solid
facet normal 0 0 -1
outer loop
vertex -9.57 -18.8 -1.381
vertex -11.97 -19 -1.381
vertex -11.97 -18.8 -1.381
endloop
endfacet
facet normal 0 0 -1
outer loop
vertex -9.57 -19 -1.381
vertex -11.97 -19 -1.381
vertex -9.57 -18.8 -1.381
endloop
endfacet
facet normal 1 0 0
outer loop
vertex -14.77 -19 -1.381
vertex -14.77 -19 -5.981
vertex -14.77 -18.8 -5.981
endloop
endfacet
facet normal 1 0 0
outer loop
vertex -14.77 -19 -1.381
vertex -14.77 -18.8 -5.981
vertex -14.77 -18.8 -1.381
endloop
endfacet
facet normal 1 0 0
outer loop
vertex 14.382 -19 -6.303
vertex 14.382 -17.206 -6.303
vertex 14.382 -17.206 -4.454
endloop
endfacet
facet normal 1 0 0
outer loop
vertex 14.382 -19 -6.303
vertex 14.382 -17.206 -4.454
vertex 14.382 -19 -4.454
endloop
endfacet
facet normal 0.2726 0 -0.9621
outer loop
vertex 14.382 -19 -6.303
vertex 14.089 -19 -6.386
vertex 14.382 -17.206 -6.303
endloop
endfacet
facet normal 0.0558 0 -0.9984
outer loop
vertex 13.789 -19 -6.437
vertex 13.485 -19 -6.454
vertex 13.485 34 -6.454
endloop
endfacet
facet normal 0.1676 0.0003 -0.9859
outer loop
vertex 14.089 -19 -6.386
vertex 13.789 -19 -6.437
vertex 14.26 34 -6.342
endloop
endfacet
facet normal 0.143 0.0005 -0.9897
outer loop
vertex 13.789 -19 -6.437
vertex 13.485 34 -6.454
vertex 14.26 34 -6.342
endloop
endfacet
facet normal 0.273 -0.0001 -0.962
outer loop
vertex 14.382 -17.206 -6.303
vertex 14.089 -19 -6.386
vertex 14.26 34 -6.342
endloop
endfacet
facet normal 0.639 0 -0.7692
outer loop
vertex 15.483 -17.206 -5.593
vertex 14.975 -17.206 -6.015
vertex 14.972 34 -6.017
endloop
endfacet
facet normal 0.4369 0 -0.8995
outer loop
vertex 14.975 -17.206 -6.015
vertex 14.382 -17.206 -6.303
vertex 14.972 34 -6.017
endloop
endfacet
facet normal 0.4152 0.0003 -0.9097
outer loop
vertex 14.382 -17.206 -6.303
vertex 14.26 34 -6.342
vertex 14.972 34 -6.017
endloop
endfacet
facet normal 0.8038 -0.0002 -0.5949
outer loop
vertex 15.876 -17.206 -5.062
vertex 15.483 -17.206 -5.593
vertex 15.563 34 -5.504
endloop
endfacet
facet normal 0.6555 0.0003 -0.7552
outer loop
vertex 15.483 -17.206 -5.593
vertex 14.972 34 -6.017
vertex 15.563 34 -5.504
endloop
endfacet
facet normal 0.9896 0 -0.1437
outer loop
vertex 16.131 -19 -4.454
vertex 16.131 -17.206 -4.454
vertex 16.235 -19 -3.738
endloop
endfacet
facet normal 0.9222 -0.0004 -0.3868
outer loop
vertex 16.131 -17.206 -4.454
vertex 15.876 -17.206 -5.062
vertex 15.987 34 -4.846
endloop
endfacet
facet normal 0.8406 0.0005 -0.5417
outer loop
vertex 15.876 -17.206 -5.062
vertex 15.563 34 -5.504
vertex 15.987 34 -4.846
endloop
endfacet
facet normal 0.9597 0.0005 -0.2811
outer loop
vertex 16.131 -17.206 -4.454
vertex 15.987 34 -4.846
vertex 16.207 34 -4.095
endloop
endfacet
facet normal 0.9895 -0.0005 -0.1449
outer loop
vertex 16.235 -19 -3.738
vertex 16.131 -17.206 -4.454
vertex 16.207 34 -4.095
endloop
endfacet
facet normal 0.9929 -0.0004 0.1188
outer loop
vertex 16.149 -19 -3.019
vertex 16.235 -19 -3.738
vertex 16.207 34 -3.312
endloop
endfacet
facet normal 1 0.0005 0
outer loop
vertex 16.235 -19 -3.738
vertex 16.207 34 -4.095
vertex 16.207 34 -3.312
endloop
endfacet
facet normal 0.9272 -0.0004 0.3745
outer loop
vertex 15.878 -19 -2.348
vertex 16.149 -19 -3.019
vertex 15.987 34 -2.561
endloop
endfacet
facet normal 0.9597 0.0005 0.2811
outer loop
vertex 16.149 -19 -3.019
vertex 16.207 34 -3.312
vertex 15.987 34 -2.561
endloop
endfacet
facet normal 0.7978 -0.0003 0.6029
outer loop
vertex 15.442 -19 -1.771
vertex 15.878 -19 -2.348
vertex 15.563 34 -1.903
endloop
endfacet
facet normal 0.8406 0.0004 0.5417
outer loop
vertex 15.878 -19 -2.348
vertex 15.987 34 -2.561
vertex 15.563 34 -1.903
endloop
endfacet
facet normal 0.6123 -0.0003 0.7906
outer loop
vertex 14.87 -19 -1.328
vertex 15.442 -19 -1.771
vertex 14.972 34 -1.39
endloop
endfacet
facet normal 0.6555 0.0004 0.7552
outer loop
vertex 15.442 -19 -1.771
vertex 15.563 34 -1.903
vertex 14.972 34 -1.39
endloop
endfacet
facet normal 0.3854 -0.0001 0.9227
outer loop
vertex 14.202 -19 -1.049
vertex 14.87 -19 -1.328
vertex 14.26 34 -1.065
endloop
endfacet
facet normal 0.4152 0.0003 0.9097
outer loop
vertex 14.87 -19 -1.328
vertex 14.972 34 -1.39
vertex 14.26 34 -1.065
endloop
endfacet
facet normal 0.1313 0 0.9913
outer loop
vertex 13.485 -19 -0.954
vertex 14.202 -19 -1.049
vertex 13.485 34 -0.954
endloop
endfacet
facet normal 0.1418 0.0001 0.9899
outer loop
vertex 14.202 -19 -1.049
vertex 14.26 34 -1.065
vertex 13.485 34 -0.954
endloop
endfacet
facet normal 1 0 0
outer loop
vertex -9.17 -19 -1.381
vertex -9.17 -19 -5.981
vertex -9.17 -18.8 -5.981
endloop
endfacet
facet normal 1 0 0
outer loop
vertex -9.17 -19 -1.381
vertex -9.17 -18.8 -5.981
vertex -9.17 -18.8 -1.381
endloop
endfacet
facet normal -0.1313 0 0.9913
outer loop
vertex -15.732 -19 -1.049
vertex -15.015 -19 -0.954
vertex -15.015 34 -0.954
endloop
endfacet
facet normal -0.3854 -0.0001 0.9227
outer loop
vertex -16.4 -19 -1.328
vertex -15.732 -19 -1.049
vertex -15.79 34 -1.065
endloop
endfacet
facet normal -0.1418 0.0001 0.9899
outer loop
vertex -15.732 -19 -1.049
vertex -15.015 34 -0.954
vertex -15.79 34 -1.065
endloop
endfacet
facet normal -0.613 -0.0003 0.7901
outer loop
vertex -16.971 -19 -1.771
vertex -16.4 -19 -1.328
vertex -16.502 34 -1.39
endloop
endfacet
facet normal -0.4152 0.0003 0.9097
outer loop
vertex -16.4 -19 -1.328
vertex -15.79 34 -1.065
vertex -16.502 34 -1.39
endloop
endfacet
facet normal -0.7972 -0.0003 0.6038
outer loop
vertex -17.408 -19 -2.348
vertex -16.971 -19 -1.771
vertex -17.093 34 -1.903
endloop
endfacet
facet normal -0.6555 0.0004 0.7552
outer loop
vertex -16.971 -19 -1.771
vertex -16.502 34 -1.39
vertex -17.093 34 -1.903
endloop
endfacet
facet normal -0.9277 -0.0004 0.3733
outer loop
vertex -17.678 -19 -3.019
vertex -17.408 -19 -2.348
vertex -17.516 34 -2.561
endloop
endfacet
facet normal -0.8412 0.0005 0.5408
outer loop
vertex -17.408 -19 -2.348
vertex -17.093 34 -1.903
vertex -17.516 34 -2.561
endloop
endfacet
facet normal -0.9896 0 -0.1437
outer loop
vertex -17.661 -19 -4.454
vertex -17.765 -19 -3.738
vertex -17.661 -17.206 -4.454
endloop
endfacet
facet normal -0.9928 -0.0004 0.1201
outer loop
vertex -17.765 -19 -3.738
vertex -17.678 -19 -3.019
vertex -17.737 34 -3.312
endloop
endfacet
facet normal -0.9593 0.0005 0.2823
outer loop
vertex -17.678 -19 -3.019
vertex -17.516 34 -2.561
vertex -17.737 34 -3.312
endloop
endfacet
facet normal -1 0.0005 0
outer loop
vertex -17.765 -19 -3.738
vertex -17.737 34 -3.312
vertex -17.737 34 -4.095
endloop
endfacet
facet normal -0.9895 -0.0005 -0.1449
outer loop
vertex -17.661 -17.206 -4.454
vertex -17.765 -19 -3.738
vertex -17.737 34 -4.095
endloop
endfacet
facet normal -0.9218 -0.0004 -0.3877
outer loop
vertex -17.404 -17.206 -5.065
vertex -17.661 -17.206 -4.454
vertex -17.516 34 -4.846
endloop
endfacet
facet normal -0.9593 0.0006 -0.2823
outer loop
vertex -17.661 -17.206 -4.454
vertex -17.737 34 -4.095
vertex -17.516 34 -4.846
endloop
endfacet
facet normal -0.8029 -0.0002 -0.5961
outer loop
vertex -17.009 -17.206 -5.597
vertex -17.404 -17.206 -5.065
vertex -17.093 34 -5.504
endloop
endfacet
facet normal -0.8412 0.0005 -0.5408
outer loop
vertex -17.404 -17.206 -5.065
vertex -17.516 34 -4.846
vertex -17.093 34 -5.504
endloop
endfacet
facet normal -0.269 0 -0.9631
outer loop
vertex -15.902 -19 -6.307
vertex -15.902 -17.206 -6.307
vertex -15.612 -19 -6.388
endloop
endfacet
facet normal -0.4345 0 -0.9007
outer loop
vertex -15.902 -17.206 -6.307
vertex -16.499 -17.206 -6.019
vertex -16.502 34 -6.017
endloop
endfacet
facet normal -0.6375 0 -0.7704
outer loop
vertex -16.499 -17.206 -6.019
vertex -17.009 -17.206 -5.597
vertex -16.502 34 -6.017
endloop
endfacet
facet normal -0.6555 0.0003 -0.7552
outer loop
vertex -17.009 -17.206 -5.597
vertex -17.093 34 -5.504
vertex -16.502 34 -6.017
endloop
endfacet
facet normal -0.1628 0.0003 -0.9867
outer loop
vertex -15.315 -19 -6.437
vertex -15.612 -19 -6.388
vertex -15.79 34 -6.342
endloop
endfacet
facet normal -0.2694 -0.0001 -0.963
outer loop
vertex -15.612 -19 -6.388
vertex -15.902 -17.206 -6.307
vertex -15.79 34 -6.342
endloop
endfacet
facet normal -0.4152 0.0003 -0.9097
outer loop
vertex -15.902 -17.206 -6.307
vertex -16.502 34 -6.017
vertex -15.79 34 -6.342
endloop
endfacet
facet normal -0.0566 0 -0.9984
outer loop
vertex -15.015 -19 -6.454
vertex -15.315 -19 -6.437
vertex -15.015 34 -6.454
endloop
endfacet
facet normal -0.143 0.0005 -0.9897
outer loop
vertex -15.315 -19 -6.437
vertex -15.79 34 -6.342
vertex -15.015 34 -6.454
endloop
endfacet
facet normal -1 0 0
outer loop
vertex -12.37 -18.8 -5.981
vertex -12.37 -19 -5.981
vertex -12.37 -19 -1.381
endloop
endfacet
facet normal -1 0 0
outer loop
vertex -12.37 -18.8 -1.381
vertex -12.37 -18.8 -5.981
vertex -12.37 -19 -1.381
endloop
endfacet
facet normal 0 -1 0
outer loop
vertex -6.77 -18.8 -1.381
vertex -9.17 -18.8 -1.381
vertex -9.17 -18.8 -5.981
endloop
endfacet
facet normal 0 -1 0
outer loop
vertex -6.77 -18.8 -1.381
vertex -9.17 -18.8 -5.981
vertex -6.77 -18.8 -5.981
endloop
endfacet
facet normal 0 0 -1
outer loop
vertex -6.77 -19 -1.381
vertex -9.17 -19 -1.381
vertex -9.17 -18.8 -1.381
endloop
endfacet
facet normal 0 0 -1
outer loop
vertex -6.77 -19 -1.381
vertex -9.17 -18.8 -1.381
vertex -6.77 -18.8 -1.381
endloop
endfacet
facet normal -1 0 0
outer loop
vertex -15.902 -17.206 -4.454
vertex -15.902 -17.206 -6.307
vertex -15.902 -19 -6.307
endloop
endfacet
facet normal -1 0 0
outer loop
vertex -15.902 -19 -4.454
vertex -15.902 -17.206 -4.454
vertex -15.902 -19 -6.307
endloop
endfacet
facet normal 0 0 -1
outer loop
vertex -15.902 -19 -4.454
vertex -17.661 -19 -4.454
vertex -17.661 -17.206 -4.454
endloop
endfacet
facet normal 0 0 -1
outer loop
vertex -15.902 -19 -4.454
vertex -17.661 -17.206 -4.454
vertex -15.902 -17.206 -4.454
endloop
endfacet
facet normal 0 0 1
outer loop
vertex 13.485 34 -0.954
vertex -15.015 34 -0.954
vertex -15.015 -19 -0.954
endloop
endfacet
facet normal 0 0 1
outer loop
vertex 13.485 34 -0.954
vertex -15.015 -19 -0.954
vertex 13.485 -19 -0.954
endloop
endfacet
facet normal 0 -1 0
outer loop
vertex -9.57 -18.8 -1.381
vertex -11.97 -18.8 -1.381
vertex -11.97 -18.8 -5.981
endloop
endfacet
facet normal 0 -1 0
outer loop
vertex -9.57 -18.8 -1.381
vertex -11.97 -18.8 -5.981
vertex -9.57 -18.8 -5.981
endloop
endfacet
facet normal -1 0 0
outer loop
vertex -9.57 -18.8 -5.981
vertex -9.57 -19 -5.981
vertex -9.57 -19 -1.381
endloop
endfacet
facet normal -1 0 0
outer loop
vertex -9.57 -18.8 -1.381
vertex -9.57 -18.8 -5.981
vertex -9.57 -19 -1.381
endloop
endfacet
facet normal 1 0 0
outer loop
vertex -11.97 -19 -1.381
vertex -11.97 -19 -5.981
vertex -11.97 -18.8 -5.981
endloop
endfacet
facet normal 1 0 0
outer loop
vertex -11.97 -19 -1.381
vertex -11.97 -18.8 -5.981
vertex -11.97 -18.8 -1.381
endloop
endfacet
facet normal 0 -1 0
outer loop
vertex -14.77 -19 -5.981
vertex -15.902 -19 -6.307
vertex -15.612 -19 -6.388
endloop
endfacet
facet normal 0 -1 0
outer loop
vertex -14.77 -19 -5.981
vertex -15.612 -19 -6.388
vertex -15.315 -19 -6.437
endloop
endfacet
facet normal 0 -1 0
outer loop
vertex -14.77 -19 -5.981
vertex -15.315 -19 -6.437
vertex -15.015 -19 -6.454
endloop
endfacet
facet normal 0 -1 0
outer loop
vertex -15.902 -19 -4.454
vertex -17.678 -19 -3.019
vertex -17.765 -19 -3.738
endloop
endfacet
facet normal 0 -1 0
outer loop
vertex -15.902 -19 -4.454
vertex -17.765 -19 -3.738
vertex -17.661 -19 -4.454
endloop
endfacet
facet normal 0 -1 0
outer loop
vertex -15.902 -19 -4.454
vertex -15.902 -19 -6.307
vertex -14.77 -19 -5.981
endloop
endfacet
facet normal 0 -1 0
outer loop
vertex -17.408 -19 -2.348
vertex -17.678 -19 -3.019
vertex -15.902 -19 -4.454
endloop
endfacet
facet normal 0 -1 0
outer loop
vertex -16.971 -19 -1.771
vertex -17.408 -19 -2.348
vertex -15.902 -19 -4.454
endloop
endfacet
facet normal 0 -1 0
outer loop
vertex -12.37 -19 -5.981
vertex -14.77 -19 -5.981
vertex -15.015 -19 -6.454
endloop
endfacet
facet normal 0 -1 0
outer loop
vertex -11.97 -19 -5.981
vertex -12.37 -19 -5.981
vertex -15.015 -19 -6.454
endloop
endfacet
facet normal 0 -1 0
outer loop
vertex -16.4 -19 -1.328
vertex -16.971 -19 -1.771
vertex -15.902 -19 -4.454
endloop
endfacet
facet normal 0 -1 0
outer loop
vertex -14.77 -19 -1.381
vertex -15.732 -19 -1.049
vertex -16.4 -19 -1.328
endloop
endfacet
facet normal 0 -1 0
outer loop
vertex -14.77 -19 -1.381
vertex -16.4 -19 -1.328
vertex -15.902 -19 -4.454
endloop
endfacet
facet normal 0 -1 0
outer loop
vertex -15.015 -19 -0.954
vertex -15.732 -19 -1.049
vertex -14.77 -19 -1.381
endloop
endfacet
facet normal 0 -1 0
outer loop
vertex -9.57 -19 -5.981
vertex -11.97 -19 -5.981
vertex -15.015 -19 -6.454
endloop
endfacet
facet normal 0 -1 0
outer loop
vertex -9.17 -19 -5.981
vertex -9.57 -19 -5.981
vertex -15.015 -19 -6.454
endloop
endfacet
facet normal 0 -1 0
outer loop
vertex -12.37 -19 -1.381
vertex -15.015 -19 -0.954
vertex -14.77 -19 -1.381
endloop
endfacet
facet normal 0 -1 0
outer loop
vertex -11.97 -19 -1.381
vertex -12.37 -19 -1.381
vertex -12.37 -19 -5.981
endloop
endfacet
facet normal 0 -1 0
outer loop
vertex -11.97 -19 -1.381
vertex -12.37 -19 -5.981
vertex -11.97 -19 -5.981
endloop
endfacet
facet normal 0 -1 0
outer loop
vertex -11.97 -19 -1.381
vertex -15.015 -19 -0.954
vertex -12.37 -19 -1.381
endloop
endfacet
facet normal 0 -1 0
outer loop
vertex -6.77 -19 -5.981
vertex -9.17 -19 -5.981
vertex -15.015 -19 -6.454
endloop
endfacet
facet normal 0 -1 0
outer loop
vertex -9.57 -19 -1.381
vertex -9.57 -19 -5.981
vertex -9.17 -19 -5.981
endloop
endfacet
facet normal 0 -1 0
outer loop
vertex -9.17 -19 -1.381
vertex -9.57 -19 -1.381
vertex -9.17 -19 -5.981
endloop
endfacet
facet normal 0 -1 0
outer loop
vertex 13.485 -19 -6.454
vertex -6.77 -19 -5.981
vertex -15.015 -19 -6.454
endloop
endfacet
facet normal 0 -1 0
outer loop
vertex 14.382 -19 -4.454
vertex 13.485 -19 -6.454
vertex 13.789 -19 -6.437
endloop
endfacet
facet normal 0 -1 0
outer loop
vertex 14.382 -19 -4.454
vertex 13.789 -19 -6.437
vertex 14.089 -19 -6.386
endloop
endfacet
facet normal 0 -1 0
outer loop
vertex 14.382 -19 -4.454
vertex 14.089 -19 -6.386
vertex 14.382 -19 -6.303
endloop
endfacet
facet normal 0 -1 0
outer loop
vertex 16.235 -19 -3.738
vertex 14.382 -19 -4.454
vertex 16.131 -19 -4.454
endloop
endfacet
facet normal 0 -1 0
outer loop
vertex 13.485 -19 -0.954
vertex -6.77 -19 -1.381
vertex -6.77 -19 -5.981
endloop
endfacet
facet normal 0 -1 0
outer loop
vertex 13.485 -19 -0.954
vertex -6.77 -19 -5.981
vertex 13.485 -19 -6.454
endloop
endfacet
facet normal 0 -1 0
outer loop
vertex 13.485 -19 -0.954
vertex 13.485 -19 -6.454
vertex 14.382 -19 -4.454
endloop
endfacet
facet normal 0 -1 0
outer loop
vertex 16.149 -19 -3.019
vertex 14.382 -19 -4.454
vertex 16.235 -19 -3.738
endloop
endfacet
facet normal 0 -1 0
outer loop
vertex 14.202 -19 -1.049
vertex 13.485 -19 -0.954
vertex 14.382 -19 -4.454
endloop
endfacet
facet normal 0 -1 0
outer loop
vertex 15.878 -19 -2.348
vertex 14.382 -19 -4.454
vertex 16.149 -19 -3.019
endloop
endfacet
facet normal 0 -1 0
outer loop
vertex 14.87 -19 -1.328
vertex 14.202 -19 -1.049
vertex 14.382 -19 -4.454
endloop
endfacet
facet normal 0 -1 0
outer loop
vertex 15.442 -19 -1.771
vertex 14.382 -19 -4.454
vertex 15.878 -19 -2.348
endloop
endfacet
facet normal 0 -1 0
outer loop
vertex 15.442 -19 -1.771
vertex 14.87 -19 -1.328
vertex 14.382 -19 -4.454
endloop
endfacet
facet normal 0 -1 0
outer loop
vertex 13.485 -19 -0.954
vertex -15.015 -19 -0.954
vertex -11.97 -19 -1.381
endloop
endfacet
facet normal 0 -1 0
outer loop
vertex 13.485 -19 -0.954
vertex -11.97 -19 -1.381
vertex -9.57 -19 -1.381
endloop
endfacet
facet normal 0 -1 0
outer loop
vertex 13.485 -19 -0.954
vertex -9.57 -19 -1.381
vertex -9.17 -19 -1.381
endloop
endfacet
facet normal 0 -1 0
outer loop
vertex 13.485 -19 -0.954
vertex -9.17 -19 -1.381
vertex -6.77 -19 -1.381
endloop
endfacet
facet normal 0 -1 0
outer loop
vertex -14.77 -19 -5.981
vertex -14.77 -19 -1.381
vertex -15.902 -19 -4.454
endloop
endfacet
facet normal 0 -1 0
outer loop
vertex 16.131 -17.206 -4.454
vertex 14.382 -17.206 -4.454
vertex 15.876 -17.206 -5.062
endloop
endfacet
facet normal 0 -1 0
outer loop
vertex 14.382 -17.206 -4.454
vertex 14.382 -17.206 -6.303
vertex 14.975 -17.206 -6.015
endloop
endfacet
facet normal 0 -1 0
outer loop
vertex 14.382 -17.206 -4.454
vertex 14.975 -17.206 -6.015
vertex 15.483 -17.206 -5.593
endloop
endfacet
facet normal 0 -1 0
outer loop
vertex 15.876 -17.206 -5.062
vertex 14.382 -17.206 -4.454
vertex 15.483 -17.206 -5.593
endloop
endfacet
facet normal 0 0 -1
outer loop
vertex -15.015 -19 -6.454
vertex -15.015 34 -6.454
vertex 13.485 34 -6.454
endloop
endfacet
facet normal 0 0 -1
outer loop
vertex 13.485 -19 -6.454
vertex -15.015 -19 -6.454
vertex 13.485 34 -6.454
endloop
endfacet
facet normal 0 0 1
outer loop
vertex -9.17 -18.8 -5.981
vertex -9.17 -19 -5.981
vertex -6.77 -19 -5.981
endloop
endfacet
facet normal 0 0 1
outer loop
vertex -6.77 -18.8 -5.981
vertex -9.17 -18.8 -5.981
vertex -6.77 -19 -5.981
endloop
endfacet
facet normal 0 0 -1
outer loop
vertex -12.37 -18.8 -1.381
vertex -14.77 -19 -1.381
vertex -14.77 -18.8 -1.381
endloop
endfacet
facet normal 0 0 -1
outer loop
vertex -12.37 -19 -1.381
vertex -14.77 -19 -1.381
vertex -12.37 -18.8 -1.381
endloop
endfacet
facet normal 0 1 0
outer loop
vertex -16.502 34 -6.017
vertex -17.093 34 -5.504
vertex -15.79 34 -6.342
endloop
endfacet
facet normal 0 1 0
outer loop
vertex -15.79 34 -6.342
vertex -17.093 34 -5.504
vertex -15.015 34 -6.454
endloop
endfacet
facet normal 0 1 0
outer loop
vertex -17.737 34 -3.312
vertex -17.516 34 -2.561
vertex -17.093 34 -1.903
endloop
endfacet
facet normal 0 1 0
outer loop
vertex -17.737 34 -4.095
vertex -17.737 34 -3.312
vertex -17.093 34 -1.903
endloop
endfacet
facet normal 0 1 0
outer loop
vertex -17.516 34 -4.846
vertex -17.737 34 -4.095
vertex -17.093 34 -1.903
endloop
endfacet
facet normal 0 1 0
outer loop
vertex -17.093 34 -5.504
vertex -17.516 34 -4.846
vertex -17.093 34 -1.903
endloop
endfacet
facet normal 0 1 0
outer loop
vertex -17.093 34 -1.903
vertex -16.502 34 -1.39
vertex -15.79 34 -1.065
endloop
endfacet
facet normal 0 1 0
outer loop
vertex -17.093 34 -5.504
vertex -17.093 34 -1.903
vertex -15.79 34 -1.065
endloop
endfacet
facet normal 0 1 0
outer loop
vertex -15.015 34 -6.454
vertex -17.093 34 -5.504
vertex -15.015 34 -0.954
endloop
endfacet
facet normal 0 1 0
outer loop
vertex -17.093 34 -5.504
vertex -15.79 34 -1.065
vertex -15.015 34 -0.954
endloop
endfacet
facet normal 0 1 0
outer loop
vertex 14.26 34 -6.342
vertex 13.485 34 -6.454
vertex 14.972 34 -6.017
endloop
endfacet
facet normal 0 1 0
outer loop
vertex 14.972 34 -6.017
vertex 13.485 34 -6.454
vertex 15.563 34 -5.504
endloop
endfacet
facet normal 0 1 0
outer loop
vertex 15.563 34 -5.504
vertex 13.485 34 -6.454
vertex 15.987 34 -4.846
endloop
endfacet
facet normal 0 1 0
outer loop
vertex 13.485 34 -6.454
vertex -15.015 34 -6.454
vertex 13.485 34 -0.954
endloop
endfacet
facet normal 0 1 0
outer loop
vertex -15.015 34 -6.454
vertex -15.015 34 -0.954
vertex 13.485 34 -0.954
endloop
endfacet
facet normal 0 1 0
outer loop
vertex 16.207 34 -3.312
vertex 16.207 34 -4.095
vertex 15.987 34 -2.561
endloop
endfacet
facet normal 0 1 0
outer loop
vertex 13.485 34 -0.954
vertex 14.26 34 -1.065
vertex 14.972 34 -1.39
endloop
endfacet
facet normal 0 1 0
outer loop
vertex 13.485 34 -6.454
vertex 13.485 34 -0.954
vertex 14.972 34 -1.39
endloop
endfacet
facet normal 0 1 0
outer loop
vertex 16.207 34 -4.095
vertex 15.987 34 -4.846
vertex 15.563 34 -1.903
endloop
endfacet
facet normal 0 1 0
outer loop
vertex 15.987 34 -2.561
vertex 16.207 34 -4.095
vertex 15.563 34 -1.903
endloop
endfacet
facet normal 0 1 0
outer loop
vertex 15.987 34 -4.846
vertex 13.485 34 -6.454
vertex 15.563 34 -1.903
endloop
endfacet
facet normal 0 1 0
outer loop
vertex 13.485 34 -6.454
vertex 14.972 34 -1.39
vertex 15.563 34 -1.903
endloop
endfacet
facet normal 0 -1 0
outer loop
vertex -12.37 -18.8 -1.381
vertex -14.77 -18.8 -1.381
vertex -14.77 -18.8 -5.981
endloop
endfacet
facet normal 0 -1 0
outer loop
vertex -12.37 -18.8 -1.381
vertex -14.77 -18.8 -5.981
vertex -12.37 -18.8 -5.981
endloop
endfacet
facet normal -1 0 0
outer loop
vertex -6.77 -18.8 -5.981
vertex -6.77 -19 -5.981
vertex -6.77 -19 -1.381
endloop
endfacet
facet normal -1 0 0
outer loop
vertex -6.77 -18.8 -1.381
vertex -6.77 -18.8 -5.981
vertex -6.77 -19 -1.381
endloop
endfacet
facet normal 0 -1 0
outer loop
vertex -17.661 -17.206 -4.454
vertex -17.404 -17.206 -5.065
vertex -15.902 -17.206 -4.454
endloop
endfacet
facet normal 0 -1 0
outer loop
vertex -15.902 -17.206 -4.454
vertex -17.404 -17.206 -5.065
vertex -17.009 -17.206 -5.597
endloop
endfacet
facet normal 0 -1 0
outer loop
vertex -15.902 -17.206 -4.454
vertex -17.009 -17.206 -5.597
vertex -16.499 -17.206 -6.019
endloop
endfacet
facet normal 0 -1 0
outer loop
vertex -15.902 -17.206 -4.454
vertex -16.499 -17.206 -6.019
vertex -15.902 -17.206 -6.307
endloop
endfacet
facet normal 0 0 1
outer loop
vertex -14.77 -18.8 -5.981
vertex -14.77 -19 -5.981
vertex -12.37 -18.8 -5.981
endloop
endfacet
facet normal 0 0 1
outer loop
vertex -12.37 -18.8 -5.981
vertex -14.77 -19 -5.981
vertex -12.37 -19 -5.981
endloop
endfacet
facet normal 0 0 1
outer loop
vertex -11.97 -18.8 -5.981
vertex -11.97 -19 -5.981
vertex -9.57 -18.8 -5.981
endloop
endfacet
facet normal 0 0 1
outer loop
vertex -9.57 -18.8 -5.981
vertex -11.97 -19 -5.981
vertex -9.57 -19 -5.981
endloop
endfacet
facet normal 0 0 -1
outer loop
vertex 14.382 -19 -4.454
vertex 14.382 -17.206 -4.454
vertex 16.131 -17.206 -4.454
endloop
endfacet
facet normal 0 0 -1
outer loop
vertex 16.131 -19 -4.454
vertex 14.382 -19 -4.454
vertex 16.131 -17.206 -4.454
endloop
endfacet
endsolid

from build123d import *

# Parameters (mm, degrees)
PAD025_DEPTH    = 53
SKETCH054_W     = 1.8
SKETCH054_H     = 1.8
POCKET026_DEPTH = 2
SKETCH119_W     = 2.4
SKETCH119_H     = 4.6
POCKET052_DEPTH = 0.2


with BuildPart() as part:
    # Sketch052 → Pad025 (new body)
    with BuildSketch(Plane.XZ):
        with BuildLine():
            ThreePointArc((-14.414866, 3.546381), (-17.164866, 0.796381), (-14.414866, -1.953619))
            Line((-14.414866, -1.953619), (14.085134, -1.953619))
            ThreePointArc((14.085134, -1.953619), (16.835134, 0.796381), (14.085134, 3.546381))
            Line((-14.414866, 3.546381), (14.085134, 3.546381))
        make_face()
    extrude(amount=PAD025_DEPTH)

    # Sketch054 (on Face2 of Pad025) → Pocket026 (cut)
    with BuildSketch(Plane(origin=(0, 0, -1.953619), x_dir=(1, 0, 0), z_dir=(0, 0, -1))):
        with Locations((-16.201848, 52.106387)):
            Rectangle(SKETCH054_W, SKETCH054_H)
        with Locations((15.881731, 52.106387)):
            Rectangle(SKETCH054_W, SKETCH054_H)
    extrude(amount=-POCKET026_DEPTH, mode=Mode.SUBTRACT)

    # Sketch119 (on Face4 of Pocket026) → Pocket052 (cut)
    with BuildSketch(Plane.XZ.offset(53)):
        with Locations((-12.97, 0.818601)):
            Rectangle(SKETCH119_W, SKETCH119_H)
        with Locations((-10.17, 0.818601)):
            Rectangle(SKETCH119_W, SKETCH119_H)
        with Locations((-7.37, 0.818601)):
            Rectangle(SKETCH119_W, SKETCH119_H)
    extrude(amount=-POCKET052_DEPTH, mode=Mode.SUBTRACT)


with BuildPart() as part_1:
    # Body007 placement: moved
    add(part.part.moved(Location((-0.6, 34, -4.5))))


solid = part_1.part
